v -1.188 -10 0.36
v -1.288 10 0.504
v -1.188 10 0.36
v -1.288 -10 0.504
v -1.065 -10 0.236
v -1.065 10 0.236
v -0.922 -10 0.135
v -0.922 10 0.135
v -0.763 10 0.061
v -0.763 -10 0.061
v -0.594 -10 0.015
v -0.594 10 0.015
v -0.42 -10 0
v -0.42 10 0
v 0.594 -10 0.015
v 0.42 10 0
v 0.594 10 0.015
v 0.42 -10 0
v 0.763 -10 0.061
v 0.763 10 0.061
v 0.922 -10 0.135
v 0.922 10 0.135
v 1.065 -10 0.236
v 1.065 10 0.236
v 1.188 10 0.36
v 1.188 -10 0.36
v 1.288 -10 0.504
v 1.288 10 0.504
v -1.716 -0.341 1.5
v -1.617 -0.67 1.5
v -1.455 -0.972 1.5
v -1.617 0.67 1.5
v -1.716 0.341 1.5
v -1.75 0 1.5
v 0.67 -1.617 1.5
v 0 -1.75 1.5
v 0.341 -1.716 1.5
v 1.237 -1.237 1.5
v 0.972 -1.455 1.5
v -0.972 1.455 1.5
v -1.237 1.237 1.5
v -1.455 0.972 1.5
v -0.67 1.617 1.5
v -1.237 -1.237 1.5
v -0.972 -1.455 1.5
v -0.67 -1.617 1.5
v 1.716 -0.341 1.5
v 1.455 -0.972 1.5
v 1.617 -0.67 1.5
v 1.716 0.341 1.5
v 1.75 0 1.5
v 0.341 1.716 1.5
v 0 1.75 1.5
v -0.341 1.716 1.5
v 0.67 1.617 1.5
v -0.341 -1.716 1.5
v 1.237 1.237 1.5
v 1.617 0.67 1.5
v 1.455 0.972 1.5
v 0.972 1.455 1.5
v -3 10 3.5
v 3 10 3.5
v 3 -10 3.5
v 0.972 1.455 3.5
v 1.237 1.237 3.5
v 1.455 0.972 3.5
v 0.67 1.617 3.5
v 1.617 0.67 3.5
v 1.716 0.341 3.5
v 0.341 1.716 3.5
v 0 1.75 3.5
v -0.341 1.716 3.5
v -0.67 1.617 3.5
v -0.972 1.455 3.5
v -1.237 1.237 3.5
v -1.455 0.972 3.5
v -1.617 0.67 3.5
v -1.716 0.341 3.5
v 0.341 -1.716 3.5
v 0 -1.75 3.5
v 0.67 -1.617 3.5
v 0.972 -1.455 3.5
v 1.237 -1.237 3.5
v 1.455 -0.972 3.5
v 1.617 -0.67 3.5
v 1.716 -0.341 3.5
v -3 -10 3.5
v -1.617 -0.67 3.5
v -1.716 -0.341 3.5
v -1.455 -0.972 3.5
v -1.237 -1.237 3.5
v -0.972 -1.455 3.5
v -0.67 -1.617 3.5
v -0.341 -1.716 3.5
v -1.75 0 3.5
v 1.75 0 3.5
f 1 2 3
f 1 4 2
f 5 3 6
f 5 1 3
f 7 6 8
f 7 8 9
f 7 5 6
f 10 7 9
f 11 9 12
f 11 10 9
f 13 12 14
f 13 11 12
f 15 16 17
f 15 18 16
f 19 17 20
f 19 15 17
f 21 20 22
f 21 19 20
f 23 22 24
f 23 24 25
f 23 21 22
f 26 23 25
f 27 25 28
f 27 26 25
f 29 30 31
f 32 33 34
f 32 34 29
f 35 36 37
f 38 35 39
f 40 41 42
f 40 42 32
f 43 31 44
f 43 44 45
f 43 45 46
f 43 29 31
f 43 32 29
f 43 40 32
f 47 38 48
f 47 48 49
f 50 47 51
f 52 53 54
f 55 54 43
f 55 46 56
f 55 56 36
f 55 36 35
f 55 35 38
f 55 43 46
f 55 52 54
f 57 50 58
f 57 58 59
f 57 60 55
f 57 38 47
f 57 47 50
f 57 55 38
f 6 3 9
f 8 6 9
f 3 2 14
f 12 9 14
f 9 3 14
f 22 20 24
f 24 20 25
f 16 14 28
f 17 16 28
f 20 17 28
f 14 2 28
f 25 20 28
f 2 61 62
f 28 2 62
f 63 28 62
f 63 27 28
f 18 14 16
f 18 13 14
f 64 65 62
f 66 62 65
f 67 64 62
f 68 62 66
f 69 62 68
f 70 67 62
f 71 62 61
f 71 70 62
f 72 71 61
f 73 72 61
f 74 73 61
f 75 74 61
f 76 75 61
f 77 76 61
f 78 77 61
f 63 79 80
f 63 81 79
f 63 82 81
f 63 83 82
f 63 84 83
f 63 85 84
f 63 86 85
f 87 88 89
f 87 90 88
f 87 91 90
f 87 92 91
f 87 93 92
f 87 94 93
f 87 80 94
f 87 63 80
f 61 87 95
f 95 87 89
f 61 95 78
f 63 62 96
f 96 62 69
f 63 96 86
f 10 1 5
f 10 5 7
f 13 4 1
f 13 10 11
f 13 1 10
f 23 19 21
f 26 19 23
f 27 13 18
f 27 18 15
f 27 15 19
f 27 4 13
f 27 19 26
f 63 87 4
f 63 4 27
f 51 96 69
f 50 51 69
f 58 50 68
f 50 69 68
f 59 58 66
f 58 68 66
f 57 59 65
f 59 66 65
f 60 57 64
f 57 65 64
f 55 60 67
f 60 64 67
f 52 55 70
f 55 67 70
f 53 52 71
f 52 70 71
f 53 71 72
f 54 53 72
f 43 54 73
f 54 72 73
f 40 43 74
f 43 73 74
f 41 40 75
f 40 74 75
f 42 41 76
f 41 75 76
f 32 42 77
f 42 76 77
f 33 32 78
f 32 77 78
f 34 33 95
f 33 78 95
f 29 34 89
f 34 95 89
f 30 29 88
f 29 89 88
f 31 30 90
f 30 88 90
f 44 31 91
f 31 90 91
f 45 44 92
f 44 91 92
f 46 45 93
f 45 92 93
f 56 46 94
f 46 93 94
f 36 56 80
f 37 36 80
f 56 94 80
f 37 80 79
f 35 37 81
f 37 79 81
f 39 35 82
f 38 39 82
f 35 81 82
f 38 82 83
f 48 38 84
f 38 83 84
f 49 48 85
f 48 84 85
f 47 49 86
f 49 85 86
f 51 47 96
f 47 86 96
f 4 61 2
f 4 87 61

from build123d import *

# Parameters (mm, degrees)
F1_DEPTH = 10
F2_R     = 1.75
F3_DEPTH = 2
F4_R     = 1


with BuildPart() as f1:
    # F0 (on Front) → F1 (new body, symmetric)
    with BuildSketch(Plane.XZ):
        Polygon((-3, 3.5), (-1, 0), (1, 0), (3, 3.5), align=None)
    extrude(amount=F1_DEPTH, both=True)

    # F2 (on face) → F3 (cut)
    with BuildSketch(Plane.XY.offset(3.5)):
        Circle(F2_R)
    extrude(amount=-F3_DEPTH, mode=Mode.SUBTRACT)

    # F4
    f4_edges = [f1.edges().sort_by_distance(p)[0] for p in [
        (1, 0, 0),
        (-1, 0, 0),
    ]]
    fillet(f4_edges, radius=F4_R)


solid = f1.part
